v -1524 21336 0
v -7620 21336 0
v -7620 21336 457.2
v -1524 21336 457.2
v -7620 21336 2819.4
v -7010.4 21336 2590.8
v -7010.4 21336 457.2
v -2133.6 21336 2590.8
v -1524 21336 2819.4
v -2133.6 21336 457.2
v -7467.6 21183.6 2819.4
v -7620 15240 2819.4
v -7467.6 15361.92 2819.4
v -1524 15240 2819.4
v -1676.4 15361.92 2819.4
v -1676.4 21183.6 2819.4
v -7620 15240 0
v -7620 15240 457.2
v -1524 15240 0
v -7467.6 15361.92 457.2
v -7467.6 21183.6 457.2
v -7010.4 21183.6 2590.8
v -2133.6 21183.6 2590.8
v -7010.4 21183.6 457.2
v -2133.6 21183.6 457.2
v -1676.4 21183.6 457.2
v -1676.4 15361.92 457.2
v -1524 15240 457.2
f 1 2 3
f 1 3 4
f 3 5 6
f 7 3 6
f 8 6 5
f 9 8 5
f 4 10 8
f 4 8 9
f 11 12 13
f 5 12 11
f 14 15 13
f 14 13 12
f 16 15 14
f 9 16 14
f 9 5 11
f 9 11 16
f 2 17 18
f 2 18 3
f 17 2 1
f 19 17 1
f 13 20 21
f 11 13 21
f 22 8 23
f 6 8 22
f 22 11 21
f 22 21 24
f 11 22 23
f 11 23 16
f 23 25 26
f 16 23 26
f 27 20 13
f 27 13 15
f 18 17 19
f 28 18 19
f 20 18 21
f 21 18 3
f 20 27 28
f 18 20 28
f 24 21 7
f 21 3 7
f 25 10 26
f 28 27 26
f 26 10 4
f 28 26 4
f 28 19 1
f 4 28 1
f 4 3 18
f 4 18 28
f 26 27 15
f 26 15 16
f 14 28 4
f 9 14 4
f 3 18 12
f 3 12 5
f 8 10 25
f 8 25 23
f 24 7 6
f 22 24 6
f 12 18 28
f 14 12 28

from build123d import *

# Parameters (mm, degrees)
F0_W     = 6096
F0_H     = 6096
F1_DEPTH = 457.2
F2_W     = 6096
F2_H     = 6096
F2_W_2   = 5791.2
F2_H_2   = 5821.68
F3_DEPTH = 2362.2
F4_W     = 4876.8
F4_H     = 2133.6
F5_DEPTH = 152.4


with BuildPart() as f1:
    # F0 (on Top) → F1 (new body)
    with BuildSketch(Plane.XY):
        with Locations((-4572, 18288)):
            Rectangle(F0_W, F0_H)
    extrude(amount=F1_DEPTH)


with BuildPart() as f3:
    # F2 (on face) → F3 (new body)
    with BuildSketch(Plane.XY.offset(457.2)):
        with Locations((-4572, 18288)):
            Rectangle(F2_W, F2_H)
        with Locations((-4572, 18272.76)):
            Rectangle(F2_W_2, F2_H_2, mode=Mode.SUBTRACT)
    extrude(amount=F3_DEPTH)

    # F4 (on face) → F5 (cut)
    with BuildSketch(Plane(origin=(0, 21336, 0), x_dir=(-1, 0, 0), z_dir=(0, 1, 0))):
        with Locations((4572, 1524)):
            Rectangle(F4_W, F4_H)
    extrude(amount=-F5_DEPTH, mode=Mode.SUBTRACT)


solid = Compound([f1.part, f3.part])
